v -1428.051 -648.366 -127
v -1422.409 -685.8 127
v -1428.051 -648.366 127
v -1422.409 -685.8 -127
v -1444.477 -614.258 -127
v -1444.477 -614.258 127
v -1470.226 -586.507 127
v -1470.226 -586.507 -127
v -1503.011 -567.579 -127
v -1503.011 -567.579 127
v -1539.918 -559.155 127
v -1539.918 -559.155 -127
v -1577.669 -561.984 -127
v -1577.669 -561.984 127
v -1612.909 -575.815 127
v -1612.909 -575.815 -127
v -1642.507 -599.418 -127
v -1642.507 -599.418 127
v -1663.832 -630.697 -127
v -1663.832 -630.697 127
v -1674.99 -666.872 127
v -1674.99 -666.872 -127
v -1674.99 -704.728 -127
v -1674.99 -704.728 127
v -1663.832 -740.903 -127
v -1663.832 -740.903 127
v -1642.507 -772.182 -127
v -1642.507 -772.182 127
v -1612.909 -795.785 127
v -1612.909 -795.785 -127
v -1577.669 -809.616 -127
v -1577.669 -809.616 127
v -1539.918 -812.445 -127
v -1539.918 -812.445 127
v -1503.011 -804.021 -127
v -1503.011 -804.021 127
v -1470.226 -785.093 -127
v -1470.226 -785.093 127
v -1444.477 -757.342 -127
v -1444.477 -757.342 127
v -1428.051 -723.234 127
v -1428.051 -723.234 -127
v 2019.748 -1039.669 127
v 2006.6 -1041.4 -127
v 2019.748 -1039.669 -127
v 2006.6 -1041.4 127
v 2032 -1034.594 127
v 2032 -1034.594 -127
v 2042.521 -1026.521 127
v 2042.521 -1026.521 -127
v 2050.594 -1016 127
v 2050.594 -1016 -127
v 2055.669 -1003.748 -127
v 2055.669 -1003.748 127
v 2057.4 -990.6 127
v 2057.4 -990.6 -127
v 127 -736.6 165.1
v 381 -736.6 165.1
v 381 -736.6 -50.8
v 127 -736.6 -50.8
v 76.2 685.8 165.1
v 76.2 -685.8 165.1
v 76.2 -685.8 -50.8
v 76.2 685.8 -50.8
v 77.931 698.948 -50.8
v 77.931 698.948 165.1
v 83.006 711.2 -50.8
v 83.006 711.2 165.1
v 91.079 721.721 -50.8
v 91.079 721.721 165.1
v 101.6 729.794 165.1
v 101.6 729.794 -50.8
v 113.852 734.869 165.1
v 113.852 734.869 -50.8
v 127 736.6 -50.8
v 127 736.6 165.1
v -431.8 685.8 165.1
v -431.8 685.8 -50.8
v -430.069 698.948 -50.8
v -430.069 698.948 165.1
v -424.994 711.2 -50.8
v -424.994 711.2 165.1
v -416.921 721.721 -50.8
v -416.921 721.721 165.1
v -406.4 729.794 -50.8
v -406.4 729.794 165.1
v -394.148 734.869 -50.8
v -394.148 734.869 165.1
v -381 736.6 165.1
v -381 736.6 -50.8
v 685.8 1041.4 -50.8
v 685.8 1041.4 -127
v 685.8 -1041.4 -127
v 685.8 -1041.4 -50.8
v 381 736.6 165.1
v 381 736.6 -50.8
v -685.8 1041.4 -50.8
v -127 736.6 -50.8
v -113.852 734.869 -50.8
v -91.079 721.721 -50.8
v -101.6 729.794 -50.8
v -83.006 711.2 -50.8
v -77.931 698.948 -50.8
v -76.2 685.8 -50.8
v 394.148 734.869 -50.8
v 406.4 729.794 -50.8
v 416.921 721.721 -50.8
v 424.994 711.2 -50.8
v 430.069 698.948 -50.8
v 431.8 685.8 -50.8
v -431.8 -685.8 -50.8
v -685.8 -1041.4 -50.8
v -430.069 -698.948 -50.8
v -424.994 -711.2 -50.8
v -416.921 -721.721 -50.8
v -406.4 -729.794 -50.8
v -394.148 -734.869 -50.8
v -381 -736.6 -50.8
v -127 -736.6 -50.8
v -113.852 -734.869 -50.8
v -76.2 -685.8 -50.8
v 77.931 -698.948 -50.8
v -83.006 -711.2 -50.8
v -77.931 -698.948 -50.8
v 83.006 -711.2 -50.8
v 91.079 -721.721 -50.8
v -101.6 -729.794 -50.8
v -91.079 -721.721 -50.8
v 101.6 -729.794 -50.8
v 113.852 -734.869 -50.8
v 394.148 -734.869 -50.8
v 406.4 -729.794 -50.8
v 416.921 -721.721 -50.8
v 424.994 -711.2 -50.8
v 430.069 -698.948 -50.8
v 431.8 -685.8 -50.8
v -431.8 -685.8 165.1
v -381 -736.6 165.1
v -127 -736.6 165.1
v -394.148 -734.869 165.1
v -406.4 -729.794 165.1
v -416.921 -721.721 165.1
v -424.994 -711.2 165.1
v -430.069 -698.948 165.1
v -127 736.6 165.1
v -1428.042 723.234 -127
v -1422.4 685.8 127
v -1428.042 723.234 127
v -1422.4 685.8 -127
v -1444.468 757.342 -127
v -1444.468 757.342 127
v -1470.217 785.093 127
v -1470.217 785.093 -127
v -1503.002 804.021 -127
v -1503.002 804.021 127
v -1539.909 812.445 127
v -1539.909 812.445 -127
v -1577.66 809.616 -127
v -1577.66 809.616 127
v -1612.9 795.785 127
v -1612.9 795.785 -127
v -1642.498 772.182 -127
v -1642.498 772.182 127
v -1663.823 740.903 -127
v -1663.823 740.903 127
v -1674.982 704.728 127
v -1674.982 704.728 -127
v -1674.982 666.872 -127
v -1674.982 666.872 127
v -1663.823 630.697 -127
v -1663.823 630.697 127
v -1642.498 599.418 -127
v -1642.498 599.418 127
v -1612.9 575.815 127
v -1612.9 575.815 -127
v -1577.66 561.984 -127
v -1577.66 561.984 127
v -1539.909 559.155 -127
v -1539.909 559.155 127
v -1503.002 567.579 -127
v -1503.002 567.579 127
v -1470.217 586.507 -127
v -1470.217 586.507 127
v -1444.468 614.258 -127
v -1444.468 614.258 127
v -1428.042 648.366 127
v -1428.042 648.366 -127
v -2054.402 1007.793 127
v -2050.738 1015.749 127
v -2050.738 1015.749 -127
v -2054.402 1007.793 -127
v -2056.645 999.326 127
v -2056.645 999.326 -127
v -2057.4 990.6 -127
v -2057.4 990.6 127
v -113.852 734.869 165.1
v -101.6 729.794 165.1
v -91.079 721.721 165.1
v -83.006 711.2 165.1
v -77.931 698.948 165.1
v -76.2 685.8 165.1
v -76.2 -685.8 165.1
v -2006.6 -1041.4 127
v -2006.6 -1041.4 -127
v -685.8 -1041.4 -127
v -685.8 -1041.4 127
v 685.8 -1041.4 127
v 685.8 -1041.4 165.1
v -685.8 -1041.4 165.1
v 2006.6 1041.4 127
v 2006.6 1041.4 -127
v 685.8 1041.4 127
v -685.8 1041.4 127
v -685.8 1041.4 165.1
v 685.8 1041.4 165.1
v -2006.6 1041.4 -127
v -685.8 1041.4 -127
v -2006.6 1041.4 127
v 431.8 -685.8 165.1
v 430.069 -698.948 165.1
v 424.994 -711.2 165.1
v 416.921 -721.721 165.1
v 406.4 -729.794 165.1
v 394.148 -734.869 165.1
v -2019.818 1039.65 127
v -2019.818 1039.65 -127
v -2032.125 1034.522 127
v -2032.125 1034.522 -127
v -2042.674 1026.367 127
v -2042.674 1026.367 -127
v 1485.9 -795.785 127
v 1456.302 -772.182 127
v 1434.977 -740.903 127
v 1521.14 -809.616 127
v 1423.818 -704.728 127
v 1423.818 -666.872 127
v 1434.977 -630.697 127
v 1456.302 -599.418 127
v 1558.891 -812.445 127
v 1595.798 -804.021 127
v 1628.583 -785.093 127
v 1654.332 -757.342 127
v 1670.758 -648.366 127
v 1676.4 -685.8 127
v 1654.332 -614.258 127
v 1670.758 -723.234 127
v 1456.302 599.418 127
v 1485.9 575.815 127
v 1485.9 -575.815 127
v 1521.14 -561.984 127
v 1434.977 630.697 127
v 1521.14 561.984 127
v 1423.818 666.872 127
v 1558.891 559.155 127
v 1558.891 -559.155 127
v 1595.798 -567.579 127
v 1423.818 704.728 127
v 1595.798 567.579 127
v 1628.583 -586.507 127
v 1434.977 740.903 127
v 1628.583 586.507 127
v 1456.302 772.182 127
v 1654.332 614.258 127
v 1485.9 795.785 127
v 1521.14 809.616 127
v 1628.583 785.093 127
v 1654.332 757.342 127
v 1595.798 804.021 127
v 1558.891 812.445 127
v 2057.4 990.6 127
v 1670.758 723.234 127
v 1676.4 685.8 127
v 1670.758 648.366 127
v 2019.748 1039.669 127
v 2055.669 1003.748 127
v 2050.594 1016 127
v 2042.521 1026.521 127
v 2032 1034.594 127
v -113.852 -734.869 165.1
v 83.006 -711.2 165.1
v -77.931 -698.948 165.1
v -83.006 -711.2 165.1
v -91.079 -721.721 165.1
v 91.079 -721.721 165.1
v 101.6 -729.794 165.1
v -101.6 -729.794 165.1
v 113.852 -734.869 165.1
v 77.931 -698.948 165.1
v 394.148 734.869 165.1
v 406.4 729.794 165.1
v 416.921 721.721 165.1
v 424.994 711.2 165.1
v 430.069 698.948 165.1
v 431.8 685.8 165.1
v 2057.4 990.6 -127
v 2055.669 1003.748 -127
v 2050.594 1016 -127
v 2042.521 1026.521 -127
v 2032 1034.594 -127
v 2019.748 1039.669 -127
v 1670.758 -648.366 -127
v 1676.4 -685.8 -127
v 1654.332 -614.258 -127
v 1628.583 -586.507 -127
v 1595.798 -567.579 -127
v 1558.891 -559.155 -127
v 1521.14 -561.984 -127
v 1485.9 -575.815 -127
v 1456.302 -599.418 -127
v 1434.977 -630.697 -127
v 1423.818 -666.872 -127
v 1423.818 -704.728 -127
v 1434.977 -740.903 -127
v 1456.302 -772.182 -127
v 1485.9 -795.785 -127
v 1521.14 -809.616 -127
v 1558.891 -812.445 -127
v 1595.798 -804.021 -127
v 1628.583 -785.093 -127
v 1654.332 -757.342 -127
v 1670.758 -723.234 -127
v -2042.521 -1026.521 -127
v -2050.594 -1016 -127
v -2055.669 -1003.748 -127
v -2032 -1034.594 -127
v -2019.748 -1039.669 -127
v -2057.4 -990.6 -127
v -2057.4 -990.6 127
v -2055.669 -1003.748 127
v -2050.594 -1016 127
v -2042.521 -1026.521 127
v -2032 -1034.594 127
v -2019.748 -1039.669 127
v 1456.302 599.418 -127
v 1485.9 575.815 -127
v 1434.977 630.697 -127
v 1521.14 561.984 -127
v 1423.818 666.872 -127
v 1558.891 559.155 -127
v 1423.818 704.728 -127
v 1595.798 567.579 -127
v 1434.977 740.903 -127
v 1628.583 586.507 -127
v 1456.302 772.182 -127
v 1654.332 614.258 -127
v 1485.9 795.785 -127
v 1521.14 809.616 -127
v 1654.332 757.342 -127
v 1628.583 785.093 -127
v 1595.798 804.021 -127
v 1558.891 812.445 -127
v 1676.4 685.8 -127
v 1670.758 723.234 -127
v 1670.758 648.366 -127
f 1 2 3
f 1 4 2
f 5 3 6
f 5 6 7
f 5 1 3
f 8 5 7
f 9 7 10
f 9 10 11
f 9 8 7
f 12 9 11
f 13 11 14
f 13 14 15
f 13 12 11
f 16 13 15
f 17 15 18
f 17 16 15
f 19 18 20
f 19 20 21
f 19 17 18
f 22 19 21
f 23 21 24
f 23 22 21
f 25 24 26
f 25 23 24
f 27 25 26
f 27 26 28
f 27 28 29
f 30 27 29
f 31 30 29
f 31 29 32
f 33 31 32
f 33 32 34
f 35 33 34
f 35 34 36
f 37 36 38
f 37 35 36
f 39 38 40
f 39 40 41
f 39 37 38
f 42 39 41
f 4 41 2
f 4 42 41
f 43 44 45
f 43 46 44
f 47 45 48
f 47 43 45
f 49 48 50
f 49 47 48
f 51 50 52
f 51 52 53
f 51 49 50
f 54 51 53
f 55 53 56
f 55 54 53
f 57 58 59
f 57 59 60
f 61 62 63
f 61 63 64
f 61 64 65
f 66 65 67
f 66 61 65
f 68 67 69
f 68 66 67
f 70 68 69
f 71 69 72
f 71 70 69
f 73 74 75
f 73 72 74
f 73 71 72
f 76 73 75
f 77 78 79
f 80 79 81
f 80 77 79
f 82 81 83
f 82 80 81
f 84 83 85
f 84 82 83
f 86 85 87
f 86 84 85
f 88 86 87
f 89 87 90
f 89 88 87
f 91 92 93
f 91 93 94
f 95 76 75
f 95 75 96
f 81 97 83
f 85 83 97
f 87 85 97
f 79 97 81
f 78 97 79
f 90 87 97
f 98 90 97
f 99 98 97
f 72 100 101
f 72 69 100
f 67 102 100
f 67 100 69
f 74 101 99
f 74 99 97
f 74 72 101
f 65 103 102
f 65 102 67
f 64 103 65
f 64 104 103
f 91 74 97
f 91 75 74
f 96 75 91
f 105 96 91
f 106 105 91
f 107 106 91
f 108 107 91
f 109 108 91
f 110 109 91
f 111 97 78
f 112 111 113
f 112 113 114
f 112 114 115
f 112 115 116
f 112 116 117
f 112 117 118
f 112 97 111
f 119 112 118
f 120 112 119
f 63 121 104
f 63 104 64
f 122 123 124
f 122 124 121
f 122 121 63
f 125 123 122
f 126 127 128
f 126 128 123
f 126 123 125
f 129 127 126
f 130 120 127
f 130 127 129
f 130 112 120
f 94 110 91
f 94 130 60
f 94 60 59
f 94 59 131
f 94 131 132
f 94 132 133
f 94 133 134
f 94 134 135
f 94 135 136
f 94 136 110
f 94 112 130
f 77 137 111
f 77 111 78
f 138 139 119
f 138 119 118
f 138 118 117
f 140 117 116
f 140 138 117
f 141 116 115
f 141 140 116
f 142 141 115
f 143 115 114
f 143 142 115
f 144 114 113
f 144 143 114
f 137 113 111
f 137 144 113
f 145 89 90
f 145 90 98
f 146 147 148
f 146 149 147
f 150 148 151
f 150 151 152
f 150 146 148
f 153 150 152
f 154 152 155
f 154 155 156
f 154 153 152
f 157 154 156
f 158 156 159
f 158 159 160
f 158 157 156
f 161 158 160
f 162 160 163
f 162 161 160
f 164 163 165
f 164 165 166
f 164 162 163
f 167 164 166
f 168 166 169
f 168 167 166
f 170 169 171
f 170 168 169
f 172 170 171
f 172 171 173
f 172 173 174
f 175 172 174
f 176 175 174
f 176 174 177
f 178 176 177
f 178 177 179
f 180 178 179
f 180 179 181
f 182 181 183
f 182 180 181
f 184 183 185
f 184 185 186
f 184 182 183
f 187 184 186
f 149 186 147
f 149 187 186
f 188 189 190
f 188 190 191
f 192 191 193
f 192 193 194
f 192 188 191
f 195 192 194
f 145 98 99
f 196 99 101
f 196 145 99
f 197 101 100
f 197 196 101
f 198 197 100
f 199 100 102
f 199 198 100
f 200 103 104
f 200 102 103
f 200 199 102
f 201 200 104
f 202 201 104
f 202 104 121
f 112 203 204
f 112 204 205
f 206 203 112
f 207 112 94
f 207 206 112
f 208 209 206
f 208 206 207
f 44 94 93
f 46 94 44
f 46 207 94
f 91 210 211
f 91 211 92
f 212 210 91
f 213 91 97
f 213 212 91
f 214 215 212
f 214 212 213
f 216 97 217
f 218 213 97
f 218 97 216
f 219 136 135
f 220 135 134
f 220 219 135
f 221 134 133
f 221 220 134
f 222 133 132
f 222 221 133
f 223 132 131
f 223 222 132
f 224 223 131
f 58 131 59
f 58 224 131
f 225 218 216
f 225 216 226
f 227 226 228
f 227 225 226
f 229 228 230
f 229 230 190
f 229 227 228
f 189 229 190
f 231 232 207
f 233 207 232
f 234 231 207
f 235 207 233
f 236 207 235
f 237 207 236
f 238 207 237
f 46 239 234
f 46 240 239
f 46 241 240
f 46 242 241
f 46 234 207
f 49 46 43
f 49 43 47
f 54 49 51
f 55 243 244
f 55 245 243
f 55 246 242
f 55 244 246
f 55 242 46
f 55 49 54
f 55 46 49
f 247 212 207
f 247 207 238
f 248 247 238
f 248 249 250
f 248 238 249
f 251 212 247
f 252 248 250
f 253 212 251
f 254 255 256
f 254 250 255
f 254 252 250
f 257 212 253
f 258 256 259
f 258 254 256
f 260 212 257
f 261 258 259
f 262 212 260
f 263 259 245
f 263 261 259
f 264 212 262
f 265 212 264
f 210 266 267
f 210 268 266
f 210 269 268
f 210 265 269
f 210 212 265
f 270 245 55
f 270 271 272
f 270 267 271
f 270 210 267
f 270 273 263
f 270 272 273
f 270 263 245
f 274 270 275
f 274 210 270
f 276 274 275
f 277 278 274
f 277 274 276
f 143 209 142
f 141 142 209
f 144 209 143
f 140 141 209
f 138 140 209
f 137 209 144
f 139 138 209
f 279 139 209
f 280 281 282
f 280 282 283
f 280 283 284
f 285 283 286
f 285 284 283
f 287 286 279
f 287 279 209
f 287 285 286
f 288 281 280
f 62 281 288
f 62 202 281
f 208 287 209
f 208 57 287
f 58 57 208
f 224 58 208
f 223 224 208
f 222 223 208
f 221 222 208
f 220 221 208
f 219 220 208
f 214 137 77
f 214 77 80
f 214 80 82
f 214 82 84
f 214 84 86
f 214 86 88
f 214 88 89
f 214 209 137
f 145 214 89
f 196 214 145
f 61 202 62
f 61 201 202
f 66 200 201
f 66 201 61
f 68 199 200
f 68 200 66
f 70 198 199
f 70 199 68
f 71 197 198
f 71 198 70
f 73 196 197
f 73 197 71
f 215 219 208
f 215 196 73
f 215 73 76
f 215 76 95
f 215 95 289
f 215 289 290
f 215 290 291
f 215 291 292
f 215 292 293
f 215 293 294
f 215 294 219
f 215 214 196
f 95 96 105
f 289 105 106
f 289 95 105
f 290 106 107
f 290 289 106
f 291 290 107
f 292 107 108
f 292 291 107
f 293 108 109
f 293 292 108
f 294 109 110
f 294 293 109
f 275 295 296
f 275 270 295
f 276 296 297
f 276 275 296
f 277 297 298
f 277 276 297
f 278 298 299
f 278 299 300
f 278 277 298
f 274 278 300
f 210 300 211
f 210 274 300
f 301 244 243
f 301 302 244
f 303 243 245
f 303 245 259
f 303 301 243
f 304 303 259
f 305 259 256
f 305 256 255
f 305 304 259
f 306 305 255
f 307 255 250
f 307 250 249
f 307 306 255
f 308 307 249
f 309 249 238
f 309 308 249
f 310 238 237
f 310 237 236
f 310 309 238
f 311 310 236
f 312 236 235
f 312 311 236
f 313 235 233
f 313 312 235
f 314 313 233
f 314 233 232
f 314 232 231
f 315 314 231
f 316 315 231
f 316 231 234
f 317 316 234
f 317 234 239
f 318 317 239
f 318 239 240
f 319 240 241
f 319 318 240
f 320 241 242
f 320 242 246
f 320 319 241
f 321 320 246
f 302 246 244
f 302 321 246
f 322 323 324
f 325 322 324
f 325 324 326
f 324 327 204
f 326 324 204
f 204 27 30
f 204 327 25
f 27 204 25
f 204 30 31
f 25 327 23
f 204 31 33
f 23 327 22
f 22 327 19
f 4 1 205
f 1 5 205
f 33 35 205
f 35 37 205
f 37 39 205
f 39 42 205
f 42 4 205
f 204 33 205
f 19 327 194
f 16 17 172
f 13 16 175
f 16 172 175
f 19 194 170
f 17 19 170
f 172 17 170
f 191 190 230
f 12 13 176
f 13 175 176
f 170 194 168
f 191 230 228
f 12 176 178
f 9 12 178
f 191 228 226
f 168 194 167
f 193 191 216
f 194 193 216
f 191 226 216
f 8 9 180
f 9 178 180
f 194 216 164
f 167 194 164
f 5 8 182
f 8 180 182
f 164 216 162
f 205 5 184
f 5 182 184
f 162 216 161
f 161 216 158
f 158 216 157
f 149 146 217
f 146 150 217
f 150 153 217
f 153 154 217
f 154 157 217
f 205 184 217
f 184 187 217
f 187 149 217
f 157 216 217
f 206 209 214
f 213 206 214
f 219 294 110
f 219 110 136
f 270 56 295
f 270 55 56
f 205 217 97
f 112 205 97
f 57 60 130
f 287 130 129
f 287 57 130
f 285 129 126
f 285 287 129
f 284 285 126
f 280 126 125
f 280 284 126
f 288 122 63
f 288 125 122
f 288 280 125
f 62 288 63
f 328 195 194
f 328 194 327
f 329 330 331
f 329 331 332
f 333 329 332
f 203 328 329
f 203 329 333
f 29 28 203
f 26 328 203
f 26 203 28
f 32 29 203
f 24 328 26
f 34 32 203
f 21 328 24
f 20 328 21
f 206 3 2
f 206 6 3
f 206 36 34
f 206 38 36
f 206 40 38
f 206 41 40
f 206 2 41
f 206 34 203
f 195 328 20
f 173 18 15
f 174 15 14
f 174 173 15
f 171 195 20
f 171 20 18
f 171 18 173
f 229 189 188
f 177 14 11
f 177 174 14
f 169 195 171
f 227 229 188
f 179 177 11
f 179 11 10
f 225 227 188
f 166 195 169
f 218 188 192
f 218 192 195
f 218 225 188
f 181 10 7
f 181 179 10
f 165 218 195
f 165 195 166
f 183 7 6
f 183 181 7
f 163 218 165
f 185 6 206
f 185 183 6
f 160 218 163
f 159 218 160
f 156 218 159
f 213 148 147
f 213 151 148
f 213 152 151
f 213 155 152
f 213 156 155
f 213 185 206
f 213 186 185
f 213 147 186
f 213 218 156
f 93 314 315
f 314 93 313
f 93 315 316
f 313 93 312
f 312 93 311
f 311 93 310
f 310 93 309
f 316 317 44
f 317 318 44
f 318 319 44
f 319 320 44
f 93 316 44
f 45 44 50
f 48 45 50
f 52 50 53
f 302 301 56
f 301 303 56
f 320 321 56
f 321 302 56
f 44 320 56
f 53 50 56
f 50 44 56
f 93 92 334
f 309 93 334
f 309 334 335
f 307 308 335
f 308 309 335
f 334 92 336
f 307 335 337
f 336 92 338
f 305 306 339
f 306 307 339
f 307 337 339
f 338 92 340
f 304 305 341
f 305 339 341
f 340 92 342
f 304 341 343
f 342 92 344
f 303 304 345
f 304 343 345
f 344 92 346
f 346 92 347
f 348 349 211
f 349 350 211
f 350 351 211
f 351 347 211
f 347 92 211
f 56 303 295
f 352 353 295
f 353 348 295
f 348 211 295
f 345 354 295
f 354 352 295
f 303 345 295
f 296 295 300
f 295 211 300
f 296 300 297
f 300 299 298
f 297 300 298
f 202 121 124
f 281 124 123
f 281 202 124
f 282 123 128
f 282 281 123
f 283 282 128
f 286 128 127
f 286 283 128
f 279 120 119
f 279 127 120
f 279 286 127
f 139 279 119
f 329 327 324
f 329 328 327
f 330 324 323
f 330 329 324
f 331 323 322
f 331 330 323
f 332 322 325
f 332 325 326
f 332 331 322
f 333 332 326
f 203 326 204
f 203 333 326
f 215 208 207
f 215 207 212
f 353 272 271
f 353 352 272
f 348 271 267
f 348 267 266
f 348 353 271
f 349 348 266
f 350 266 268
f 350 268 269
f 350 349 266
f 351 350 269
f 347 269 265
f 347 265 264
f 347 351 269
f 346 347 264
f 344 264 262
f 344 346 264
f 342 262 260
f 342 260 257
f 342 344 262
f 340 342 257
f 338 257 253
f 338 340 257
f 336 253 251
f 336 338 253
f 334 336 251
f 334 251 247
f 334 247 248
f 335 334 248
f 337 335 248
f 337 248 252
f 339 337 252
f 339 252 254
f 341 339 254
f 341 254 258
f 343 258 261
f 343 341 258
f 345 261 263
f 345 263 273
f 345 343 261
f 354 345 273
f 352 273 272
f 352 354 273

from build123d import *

# Parameters (mm, degrees)
F0_W     = 1371.6
F0_H     = 2082.8
F1_DEPTH = 165.1
F0_R     = 127
F2_DEPTH = 127
F3_W     = 1371.6
F3_H     = 114.3
F4_DEPTH = 2202.18


with BuildPart() as f1:
    # F0 (on Top) → F1 (new body, symmetric)
    with BuildSketch(Plane.XY):
        Rectangle(F0_W, F0_H)
        with BuildLine():
            ThreePointArc((-431.8, 685.8), (-416.921024, 721.721024), (-381, 736.6))
            Line((-381, 736.6), (-127, 736.6))
            ThreePointArc((-127, 736.6), (-91.078976, 721.721024), (-76.2, 685.8))
            Line((-76.2, 685.8), (-76.2, -685.8))
            ThreePointArc((-76.2, -685.8), (-91.078976, -721.721024), (-127, -736.6))
            Line((-127, -736.6), (-381, -736.6))
            ThreePointArc((-381, -736.6), (-416.921024, -721.721024), (-431.8, -685.8))
            Line((-431.8, -685.8), (-431.8, 685.8))
        make_face(mode=Mode.SUBTRACT)
        with BuildLine():
            Line((127, 736.6), (381, 736.6))
            ThreePointArc((381, 736.6), (416.921024, 721.721024), (431.8, 685.8))
            Line((431.8, 685.8), (431.8, -685.8))
            ThreePointArc((431.8, -685.8), (416.921024, -721.721024), (381, -736.6))
            Line((381, -736.6), (127, -736.6))
            ThreePointArc((127, -736.6), (91.078976, -721.721024), (76.2, -685.8))
            Line((76.2, -685.8), (76.2, 685.8))
            ThreePointArc((76.2, 685.8), (91.078976, 721.721024), (127, 736.6))
        make_face(mode=Mode.SUBTRACT)
    extrude(amount=F1_DEPTH, both=True)

    # F0 (on Top) → F2 (join, symmetric)
    with BuildSketch(Plane.XY):
        with BuildLine():
            ThreePointArc((2057.4, 990.6), (2042.521024, 1026.521024), (2006.6, 1041.4))
            Line((2006.6, 1041.4), (1549.4, 1041.4))
            Line((1549.4, 1041.4), (685.8, 1041.4))
            Line((685.8, 1041.4), (685.8, -1041.4))
            Line((685.8, -1041.4), (1549.4, -1041.4))
            Line((1549.4, -1041.4), (2006.6, -1041.4))
            ThreePointArc((2006.6, -1041.4), (2042.521024, -1026.521024), (2057.4, -990.6))
            Line((2057.4, -990.6), (2057.4, 990.6))
        make_face()
        with Locations((1549.4, -685.8)):
            Circle(F0_R, mode=Mode.SUBTRACT)
        with Locations((1549.4, 685.8)):
            Circle(F0_R, mode=Mode.SUBTRACT)
        Rectangle(F0_W, F0_H)
        with BuildLine():
            ThreePointArc((-431.8, 685.8), (-416.921024, 721.721024), (-381, 736.6))
            Line((-381, 736.6), (-127, 736.6))
            ThreePointArc((-127, 736.6), (-91.078976, 721.721024), (-76.2, 685.8))
            Line((-76.2, 685.8), (-76.2, -685.8))
            ThreePointArc((-76.2, -685.8), (-91.078976, -721.721024), (-127, -736.6))
            Line((-127, -736.6), (-381, -736.6))
            ThreePointArc((-381, -736.6), (-416.921024, -721.721024), (-431.8, -685.8))
            Line((-431.8, -685.8), (-431.8, 685.8))
        make_face(mode=Mode.SUBTRACT)
        with BuildLine():
            Line((127, 736.6), (381, 736.6))
            ThreePointArc((381, 736.6), (416.921024, 721.721024), (431.8, 685.8))
            Line((431.8, 685.8), (431.8, -685.8))
            ThreePointArc((431.8, -685.8), (416.921024, -721.721024), (381, -736.6))
            Line((381, -736.6), (127, -736.6))
            ThreePointArc((127, -736.6), (91.078976, -721.721024), (76.2, -685.8))
            Line((76.2, -685.8), (76.2, 685.8))
            ThreePointArc((76.2, 685.8), (91.078976, 721.721024), (127, 736.6))
        make_face(mode=Mode.SUBTRACT)
        with BuildLine():
            Line((-685.8, -1041.4), (-685.8, 1041.4))
            Line((-685.8, 1041.4), (-1549.4, 1041.4))
            Line((-1549.4, 1041.4), (-2006.6, 1041.4))
            ThreePointArc((-2006.6, 1041.4), (-2032.125279, 1034.521523), (-2050.738154, 1015.748825))
            ThreePointArc((-2050.738154, 1015.748825), (-2055.706304, 1003.608109), (-2057.4, 990.6))
            Line((-2057.4, 990.6), (-2057.4, -990.6))
            ThreePointArc((-2057.4, -990.6), (-2042.521024, -1026.521024), (-2006.6, -1041.4))
            Line((-2006.6, -1041.4), (-1549.408913, -1041.4))
            Line((-1549.408913, -1041.4), (-685.8, -1041.4))
        make_face()
        with Locations((-1549.408913, -685.8)):
            Circle(F0_R, mode=Mode.SUBTRACT)
        with Locations((-1549.4, 685.8)):
            Circle(F0_R, mode=Mode.SUBTRACT)
    extrude(amount=F2_DEPTH, both=True)

    # F3 (on face) → F4 (cut)
    with BuildSketch(Plane.XZ.offset(1041.4)):
        with Locations((0, -107.95)):
            Rectangle(F3_W, F3_H)
    extrude(amount=-F4_DEPTH, mode=Mode.SUBTRACT)


solid = f1.part
